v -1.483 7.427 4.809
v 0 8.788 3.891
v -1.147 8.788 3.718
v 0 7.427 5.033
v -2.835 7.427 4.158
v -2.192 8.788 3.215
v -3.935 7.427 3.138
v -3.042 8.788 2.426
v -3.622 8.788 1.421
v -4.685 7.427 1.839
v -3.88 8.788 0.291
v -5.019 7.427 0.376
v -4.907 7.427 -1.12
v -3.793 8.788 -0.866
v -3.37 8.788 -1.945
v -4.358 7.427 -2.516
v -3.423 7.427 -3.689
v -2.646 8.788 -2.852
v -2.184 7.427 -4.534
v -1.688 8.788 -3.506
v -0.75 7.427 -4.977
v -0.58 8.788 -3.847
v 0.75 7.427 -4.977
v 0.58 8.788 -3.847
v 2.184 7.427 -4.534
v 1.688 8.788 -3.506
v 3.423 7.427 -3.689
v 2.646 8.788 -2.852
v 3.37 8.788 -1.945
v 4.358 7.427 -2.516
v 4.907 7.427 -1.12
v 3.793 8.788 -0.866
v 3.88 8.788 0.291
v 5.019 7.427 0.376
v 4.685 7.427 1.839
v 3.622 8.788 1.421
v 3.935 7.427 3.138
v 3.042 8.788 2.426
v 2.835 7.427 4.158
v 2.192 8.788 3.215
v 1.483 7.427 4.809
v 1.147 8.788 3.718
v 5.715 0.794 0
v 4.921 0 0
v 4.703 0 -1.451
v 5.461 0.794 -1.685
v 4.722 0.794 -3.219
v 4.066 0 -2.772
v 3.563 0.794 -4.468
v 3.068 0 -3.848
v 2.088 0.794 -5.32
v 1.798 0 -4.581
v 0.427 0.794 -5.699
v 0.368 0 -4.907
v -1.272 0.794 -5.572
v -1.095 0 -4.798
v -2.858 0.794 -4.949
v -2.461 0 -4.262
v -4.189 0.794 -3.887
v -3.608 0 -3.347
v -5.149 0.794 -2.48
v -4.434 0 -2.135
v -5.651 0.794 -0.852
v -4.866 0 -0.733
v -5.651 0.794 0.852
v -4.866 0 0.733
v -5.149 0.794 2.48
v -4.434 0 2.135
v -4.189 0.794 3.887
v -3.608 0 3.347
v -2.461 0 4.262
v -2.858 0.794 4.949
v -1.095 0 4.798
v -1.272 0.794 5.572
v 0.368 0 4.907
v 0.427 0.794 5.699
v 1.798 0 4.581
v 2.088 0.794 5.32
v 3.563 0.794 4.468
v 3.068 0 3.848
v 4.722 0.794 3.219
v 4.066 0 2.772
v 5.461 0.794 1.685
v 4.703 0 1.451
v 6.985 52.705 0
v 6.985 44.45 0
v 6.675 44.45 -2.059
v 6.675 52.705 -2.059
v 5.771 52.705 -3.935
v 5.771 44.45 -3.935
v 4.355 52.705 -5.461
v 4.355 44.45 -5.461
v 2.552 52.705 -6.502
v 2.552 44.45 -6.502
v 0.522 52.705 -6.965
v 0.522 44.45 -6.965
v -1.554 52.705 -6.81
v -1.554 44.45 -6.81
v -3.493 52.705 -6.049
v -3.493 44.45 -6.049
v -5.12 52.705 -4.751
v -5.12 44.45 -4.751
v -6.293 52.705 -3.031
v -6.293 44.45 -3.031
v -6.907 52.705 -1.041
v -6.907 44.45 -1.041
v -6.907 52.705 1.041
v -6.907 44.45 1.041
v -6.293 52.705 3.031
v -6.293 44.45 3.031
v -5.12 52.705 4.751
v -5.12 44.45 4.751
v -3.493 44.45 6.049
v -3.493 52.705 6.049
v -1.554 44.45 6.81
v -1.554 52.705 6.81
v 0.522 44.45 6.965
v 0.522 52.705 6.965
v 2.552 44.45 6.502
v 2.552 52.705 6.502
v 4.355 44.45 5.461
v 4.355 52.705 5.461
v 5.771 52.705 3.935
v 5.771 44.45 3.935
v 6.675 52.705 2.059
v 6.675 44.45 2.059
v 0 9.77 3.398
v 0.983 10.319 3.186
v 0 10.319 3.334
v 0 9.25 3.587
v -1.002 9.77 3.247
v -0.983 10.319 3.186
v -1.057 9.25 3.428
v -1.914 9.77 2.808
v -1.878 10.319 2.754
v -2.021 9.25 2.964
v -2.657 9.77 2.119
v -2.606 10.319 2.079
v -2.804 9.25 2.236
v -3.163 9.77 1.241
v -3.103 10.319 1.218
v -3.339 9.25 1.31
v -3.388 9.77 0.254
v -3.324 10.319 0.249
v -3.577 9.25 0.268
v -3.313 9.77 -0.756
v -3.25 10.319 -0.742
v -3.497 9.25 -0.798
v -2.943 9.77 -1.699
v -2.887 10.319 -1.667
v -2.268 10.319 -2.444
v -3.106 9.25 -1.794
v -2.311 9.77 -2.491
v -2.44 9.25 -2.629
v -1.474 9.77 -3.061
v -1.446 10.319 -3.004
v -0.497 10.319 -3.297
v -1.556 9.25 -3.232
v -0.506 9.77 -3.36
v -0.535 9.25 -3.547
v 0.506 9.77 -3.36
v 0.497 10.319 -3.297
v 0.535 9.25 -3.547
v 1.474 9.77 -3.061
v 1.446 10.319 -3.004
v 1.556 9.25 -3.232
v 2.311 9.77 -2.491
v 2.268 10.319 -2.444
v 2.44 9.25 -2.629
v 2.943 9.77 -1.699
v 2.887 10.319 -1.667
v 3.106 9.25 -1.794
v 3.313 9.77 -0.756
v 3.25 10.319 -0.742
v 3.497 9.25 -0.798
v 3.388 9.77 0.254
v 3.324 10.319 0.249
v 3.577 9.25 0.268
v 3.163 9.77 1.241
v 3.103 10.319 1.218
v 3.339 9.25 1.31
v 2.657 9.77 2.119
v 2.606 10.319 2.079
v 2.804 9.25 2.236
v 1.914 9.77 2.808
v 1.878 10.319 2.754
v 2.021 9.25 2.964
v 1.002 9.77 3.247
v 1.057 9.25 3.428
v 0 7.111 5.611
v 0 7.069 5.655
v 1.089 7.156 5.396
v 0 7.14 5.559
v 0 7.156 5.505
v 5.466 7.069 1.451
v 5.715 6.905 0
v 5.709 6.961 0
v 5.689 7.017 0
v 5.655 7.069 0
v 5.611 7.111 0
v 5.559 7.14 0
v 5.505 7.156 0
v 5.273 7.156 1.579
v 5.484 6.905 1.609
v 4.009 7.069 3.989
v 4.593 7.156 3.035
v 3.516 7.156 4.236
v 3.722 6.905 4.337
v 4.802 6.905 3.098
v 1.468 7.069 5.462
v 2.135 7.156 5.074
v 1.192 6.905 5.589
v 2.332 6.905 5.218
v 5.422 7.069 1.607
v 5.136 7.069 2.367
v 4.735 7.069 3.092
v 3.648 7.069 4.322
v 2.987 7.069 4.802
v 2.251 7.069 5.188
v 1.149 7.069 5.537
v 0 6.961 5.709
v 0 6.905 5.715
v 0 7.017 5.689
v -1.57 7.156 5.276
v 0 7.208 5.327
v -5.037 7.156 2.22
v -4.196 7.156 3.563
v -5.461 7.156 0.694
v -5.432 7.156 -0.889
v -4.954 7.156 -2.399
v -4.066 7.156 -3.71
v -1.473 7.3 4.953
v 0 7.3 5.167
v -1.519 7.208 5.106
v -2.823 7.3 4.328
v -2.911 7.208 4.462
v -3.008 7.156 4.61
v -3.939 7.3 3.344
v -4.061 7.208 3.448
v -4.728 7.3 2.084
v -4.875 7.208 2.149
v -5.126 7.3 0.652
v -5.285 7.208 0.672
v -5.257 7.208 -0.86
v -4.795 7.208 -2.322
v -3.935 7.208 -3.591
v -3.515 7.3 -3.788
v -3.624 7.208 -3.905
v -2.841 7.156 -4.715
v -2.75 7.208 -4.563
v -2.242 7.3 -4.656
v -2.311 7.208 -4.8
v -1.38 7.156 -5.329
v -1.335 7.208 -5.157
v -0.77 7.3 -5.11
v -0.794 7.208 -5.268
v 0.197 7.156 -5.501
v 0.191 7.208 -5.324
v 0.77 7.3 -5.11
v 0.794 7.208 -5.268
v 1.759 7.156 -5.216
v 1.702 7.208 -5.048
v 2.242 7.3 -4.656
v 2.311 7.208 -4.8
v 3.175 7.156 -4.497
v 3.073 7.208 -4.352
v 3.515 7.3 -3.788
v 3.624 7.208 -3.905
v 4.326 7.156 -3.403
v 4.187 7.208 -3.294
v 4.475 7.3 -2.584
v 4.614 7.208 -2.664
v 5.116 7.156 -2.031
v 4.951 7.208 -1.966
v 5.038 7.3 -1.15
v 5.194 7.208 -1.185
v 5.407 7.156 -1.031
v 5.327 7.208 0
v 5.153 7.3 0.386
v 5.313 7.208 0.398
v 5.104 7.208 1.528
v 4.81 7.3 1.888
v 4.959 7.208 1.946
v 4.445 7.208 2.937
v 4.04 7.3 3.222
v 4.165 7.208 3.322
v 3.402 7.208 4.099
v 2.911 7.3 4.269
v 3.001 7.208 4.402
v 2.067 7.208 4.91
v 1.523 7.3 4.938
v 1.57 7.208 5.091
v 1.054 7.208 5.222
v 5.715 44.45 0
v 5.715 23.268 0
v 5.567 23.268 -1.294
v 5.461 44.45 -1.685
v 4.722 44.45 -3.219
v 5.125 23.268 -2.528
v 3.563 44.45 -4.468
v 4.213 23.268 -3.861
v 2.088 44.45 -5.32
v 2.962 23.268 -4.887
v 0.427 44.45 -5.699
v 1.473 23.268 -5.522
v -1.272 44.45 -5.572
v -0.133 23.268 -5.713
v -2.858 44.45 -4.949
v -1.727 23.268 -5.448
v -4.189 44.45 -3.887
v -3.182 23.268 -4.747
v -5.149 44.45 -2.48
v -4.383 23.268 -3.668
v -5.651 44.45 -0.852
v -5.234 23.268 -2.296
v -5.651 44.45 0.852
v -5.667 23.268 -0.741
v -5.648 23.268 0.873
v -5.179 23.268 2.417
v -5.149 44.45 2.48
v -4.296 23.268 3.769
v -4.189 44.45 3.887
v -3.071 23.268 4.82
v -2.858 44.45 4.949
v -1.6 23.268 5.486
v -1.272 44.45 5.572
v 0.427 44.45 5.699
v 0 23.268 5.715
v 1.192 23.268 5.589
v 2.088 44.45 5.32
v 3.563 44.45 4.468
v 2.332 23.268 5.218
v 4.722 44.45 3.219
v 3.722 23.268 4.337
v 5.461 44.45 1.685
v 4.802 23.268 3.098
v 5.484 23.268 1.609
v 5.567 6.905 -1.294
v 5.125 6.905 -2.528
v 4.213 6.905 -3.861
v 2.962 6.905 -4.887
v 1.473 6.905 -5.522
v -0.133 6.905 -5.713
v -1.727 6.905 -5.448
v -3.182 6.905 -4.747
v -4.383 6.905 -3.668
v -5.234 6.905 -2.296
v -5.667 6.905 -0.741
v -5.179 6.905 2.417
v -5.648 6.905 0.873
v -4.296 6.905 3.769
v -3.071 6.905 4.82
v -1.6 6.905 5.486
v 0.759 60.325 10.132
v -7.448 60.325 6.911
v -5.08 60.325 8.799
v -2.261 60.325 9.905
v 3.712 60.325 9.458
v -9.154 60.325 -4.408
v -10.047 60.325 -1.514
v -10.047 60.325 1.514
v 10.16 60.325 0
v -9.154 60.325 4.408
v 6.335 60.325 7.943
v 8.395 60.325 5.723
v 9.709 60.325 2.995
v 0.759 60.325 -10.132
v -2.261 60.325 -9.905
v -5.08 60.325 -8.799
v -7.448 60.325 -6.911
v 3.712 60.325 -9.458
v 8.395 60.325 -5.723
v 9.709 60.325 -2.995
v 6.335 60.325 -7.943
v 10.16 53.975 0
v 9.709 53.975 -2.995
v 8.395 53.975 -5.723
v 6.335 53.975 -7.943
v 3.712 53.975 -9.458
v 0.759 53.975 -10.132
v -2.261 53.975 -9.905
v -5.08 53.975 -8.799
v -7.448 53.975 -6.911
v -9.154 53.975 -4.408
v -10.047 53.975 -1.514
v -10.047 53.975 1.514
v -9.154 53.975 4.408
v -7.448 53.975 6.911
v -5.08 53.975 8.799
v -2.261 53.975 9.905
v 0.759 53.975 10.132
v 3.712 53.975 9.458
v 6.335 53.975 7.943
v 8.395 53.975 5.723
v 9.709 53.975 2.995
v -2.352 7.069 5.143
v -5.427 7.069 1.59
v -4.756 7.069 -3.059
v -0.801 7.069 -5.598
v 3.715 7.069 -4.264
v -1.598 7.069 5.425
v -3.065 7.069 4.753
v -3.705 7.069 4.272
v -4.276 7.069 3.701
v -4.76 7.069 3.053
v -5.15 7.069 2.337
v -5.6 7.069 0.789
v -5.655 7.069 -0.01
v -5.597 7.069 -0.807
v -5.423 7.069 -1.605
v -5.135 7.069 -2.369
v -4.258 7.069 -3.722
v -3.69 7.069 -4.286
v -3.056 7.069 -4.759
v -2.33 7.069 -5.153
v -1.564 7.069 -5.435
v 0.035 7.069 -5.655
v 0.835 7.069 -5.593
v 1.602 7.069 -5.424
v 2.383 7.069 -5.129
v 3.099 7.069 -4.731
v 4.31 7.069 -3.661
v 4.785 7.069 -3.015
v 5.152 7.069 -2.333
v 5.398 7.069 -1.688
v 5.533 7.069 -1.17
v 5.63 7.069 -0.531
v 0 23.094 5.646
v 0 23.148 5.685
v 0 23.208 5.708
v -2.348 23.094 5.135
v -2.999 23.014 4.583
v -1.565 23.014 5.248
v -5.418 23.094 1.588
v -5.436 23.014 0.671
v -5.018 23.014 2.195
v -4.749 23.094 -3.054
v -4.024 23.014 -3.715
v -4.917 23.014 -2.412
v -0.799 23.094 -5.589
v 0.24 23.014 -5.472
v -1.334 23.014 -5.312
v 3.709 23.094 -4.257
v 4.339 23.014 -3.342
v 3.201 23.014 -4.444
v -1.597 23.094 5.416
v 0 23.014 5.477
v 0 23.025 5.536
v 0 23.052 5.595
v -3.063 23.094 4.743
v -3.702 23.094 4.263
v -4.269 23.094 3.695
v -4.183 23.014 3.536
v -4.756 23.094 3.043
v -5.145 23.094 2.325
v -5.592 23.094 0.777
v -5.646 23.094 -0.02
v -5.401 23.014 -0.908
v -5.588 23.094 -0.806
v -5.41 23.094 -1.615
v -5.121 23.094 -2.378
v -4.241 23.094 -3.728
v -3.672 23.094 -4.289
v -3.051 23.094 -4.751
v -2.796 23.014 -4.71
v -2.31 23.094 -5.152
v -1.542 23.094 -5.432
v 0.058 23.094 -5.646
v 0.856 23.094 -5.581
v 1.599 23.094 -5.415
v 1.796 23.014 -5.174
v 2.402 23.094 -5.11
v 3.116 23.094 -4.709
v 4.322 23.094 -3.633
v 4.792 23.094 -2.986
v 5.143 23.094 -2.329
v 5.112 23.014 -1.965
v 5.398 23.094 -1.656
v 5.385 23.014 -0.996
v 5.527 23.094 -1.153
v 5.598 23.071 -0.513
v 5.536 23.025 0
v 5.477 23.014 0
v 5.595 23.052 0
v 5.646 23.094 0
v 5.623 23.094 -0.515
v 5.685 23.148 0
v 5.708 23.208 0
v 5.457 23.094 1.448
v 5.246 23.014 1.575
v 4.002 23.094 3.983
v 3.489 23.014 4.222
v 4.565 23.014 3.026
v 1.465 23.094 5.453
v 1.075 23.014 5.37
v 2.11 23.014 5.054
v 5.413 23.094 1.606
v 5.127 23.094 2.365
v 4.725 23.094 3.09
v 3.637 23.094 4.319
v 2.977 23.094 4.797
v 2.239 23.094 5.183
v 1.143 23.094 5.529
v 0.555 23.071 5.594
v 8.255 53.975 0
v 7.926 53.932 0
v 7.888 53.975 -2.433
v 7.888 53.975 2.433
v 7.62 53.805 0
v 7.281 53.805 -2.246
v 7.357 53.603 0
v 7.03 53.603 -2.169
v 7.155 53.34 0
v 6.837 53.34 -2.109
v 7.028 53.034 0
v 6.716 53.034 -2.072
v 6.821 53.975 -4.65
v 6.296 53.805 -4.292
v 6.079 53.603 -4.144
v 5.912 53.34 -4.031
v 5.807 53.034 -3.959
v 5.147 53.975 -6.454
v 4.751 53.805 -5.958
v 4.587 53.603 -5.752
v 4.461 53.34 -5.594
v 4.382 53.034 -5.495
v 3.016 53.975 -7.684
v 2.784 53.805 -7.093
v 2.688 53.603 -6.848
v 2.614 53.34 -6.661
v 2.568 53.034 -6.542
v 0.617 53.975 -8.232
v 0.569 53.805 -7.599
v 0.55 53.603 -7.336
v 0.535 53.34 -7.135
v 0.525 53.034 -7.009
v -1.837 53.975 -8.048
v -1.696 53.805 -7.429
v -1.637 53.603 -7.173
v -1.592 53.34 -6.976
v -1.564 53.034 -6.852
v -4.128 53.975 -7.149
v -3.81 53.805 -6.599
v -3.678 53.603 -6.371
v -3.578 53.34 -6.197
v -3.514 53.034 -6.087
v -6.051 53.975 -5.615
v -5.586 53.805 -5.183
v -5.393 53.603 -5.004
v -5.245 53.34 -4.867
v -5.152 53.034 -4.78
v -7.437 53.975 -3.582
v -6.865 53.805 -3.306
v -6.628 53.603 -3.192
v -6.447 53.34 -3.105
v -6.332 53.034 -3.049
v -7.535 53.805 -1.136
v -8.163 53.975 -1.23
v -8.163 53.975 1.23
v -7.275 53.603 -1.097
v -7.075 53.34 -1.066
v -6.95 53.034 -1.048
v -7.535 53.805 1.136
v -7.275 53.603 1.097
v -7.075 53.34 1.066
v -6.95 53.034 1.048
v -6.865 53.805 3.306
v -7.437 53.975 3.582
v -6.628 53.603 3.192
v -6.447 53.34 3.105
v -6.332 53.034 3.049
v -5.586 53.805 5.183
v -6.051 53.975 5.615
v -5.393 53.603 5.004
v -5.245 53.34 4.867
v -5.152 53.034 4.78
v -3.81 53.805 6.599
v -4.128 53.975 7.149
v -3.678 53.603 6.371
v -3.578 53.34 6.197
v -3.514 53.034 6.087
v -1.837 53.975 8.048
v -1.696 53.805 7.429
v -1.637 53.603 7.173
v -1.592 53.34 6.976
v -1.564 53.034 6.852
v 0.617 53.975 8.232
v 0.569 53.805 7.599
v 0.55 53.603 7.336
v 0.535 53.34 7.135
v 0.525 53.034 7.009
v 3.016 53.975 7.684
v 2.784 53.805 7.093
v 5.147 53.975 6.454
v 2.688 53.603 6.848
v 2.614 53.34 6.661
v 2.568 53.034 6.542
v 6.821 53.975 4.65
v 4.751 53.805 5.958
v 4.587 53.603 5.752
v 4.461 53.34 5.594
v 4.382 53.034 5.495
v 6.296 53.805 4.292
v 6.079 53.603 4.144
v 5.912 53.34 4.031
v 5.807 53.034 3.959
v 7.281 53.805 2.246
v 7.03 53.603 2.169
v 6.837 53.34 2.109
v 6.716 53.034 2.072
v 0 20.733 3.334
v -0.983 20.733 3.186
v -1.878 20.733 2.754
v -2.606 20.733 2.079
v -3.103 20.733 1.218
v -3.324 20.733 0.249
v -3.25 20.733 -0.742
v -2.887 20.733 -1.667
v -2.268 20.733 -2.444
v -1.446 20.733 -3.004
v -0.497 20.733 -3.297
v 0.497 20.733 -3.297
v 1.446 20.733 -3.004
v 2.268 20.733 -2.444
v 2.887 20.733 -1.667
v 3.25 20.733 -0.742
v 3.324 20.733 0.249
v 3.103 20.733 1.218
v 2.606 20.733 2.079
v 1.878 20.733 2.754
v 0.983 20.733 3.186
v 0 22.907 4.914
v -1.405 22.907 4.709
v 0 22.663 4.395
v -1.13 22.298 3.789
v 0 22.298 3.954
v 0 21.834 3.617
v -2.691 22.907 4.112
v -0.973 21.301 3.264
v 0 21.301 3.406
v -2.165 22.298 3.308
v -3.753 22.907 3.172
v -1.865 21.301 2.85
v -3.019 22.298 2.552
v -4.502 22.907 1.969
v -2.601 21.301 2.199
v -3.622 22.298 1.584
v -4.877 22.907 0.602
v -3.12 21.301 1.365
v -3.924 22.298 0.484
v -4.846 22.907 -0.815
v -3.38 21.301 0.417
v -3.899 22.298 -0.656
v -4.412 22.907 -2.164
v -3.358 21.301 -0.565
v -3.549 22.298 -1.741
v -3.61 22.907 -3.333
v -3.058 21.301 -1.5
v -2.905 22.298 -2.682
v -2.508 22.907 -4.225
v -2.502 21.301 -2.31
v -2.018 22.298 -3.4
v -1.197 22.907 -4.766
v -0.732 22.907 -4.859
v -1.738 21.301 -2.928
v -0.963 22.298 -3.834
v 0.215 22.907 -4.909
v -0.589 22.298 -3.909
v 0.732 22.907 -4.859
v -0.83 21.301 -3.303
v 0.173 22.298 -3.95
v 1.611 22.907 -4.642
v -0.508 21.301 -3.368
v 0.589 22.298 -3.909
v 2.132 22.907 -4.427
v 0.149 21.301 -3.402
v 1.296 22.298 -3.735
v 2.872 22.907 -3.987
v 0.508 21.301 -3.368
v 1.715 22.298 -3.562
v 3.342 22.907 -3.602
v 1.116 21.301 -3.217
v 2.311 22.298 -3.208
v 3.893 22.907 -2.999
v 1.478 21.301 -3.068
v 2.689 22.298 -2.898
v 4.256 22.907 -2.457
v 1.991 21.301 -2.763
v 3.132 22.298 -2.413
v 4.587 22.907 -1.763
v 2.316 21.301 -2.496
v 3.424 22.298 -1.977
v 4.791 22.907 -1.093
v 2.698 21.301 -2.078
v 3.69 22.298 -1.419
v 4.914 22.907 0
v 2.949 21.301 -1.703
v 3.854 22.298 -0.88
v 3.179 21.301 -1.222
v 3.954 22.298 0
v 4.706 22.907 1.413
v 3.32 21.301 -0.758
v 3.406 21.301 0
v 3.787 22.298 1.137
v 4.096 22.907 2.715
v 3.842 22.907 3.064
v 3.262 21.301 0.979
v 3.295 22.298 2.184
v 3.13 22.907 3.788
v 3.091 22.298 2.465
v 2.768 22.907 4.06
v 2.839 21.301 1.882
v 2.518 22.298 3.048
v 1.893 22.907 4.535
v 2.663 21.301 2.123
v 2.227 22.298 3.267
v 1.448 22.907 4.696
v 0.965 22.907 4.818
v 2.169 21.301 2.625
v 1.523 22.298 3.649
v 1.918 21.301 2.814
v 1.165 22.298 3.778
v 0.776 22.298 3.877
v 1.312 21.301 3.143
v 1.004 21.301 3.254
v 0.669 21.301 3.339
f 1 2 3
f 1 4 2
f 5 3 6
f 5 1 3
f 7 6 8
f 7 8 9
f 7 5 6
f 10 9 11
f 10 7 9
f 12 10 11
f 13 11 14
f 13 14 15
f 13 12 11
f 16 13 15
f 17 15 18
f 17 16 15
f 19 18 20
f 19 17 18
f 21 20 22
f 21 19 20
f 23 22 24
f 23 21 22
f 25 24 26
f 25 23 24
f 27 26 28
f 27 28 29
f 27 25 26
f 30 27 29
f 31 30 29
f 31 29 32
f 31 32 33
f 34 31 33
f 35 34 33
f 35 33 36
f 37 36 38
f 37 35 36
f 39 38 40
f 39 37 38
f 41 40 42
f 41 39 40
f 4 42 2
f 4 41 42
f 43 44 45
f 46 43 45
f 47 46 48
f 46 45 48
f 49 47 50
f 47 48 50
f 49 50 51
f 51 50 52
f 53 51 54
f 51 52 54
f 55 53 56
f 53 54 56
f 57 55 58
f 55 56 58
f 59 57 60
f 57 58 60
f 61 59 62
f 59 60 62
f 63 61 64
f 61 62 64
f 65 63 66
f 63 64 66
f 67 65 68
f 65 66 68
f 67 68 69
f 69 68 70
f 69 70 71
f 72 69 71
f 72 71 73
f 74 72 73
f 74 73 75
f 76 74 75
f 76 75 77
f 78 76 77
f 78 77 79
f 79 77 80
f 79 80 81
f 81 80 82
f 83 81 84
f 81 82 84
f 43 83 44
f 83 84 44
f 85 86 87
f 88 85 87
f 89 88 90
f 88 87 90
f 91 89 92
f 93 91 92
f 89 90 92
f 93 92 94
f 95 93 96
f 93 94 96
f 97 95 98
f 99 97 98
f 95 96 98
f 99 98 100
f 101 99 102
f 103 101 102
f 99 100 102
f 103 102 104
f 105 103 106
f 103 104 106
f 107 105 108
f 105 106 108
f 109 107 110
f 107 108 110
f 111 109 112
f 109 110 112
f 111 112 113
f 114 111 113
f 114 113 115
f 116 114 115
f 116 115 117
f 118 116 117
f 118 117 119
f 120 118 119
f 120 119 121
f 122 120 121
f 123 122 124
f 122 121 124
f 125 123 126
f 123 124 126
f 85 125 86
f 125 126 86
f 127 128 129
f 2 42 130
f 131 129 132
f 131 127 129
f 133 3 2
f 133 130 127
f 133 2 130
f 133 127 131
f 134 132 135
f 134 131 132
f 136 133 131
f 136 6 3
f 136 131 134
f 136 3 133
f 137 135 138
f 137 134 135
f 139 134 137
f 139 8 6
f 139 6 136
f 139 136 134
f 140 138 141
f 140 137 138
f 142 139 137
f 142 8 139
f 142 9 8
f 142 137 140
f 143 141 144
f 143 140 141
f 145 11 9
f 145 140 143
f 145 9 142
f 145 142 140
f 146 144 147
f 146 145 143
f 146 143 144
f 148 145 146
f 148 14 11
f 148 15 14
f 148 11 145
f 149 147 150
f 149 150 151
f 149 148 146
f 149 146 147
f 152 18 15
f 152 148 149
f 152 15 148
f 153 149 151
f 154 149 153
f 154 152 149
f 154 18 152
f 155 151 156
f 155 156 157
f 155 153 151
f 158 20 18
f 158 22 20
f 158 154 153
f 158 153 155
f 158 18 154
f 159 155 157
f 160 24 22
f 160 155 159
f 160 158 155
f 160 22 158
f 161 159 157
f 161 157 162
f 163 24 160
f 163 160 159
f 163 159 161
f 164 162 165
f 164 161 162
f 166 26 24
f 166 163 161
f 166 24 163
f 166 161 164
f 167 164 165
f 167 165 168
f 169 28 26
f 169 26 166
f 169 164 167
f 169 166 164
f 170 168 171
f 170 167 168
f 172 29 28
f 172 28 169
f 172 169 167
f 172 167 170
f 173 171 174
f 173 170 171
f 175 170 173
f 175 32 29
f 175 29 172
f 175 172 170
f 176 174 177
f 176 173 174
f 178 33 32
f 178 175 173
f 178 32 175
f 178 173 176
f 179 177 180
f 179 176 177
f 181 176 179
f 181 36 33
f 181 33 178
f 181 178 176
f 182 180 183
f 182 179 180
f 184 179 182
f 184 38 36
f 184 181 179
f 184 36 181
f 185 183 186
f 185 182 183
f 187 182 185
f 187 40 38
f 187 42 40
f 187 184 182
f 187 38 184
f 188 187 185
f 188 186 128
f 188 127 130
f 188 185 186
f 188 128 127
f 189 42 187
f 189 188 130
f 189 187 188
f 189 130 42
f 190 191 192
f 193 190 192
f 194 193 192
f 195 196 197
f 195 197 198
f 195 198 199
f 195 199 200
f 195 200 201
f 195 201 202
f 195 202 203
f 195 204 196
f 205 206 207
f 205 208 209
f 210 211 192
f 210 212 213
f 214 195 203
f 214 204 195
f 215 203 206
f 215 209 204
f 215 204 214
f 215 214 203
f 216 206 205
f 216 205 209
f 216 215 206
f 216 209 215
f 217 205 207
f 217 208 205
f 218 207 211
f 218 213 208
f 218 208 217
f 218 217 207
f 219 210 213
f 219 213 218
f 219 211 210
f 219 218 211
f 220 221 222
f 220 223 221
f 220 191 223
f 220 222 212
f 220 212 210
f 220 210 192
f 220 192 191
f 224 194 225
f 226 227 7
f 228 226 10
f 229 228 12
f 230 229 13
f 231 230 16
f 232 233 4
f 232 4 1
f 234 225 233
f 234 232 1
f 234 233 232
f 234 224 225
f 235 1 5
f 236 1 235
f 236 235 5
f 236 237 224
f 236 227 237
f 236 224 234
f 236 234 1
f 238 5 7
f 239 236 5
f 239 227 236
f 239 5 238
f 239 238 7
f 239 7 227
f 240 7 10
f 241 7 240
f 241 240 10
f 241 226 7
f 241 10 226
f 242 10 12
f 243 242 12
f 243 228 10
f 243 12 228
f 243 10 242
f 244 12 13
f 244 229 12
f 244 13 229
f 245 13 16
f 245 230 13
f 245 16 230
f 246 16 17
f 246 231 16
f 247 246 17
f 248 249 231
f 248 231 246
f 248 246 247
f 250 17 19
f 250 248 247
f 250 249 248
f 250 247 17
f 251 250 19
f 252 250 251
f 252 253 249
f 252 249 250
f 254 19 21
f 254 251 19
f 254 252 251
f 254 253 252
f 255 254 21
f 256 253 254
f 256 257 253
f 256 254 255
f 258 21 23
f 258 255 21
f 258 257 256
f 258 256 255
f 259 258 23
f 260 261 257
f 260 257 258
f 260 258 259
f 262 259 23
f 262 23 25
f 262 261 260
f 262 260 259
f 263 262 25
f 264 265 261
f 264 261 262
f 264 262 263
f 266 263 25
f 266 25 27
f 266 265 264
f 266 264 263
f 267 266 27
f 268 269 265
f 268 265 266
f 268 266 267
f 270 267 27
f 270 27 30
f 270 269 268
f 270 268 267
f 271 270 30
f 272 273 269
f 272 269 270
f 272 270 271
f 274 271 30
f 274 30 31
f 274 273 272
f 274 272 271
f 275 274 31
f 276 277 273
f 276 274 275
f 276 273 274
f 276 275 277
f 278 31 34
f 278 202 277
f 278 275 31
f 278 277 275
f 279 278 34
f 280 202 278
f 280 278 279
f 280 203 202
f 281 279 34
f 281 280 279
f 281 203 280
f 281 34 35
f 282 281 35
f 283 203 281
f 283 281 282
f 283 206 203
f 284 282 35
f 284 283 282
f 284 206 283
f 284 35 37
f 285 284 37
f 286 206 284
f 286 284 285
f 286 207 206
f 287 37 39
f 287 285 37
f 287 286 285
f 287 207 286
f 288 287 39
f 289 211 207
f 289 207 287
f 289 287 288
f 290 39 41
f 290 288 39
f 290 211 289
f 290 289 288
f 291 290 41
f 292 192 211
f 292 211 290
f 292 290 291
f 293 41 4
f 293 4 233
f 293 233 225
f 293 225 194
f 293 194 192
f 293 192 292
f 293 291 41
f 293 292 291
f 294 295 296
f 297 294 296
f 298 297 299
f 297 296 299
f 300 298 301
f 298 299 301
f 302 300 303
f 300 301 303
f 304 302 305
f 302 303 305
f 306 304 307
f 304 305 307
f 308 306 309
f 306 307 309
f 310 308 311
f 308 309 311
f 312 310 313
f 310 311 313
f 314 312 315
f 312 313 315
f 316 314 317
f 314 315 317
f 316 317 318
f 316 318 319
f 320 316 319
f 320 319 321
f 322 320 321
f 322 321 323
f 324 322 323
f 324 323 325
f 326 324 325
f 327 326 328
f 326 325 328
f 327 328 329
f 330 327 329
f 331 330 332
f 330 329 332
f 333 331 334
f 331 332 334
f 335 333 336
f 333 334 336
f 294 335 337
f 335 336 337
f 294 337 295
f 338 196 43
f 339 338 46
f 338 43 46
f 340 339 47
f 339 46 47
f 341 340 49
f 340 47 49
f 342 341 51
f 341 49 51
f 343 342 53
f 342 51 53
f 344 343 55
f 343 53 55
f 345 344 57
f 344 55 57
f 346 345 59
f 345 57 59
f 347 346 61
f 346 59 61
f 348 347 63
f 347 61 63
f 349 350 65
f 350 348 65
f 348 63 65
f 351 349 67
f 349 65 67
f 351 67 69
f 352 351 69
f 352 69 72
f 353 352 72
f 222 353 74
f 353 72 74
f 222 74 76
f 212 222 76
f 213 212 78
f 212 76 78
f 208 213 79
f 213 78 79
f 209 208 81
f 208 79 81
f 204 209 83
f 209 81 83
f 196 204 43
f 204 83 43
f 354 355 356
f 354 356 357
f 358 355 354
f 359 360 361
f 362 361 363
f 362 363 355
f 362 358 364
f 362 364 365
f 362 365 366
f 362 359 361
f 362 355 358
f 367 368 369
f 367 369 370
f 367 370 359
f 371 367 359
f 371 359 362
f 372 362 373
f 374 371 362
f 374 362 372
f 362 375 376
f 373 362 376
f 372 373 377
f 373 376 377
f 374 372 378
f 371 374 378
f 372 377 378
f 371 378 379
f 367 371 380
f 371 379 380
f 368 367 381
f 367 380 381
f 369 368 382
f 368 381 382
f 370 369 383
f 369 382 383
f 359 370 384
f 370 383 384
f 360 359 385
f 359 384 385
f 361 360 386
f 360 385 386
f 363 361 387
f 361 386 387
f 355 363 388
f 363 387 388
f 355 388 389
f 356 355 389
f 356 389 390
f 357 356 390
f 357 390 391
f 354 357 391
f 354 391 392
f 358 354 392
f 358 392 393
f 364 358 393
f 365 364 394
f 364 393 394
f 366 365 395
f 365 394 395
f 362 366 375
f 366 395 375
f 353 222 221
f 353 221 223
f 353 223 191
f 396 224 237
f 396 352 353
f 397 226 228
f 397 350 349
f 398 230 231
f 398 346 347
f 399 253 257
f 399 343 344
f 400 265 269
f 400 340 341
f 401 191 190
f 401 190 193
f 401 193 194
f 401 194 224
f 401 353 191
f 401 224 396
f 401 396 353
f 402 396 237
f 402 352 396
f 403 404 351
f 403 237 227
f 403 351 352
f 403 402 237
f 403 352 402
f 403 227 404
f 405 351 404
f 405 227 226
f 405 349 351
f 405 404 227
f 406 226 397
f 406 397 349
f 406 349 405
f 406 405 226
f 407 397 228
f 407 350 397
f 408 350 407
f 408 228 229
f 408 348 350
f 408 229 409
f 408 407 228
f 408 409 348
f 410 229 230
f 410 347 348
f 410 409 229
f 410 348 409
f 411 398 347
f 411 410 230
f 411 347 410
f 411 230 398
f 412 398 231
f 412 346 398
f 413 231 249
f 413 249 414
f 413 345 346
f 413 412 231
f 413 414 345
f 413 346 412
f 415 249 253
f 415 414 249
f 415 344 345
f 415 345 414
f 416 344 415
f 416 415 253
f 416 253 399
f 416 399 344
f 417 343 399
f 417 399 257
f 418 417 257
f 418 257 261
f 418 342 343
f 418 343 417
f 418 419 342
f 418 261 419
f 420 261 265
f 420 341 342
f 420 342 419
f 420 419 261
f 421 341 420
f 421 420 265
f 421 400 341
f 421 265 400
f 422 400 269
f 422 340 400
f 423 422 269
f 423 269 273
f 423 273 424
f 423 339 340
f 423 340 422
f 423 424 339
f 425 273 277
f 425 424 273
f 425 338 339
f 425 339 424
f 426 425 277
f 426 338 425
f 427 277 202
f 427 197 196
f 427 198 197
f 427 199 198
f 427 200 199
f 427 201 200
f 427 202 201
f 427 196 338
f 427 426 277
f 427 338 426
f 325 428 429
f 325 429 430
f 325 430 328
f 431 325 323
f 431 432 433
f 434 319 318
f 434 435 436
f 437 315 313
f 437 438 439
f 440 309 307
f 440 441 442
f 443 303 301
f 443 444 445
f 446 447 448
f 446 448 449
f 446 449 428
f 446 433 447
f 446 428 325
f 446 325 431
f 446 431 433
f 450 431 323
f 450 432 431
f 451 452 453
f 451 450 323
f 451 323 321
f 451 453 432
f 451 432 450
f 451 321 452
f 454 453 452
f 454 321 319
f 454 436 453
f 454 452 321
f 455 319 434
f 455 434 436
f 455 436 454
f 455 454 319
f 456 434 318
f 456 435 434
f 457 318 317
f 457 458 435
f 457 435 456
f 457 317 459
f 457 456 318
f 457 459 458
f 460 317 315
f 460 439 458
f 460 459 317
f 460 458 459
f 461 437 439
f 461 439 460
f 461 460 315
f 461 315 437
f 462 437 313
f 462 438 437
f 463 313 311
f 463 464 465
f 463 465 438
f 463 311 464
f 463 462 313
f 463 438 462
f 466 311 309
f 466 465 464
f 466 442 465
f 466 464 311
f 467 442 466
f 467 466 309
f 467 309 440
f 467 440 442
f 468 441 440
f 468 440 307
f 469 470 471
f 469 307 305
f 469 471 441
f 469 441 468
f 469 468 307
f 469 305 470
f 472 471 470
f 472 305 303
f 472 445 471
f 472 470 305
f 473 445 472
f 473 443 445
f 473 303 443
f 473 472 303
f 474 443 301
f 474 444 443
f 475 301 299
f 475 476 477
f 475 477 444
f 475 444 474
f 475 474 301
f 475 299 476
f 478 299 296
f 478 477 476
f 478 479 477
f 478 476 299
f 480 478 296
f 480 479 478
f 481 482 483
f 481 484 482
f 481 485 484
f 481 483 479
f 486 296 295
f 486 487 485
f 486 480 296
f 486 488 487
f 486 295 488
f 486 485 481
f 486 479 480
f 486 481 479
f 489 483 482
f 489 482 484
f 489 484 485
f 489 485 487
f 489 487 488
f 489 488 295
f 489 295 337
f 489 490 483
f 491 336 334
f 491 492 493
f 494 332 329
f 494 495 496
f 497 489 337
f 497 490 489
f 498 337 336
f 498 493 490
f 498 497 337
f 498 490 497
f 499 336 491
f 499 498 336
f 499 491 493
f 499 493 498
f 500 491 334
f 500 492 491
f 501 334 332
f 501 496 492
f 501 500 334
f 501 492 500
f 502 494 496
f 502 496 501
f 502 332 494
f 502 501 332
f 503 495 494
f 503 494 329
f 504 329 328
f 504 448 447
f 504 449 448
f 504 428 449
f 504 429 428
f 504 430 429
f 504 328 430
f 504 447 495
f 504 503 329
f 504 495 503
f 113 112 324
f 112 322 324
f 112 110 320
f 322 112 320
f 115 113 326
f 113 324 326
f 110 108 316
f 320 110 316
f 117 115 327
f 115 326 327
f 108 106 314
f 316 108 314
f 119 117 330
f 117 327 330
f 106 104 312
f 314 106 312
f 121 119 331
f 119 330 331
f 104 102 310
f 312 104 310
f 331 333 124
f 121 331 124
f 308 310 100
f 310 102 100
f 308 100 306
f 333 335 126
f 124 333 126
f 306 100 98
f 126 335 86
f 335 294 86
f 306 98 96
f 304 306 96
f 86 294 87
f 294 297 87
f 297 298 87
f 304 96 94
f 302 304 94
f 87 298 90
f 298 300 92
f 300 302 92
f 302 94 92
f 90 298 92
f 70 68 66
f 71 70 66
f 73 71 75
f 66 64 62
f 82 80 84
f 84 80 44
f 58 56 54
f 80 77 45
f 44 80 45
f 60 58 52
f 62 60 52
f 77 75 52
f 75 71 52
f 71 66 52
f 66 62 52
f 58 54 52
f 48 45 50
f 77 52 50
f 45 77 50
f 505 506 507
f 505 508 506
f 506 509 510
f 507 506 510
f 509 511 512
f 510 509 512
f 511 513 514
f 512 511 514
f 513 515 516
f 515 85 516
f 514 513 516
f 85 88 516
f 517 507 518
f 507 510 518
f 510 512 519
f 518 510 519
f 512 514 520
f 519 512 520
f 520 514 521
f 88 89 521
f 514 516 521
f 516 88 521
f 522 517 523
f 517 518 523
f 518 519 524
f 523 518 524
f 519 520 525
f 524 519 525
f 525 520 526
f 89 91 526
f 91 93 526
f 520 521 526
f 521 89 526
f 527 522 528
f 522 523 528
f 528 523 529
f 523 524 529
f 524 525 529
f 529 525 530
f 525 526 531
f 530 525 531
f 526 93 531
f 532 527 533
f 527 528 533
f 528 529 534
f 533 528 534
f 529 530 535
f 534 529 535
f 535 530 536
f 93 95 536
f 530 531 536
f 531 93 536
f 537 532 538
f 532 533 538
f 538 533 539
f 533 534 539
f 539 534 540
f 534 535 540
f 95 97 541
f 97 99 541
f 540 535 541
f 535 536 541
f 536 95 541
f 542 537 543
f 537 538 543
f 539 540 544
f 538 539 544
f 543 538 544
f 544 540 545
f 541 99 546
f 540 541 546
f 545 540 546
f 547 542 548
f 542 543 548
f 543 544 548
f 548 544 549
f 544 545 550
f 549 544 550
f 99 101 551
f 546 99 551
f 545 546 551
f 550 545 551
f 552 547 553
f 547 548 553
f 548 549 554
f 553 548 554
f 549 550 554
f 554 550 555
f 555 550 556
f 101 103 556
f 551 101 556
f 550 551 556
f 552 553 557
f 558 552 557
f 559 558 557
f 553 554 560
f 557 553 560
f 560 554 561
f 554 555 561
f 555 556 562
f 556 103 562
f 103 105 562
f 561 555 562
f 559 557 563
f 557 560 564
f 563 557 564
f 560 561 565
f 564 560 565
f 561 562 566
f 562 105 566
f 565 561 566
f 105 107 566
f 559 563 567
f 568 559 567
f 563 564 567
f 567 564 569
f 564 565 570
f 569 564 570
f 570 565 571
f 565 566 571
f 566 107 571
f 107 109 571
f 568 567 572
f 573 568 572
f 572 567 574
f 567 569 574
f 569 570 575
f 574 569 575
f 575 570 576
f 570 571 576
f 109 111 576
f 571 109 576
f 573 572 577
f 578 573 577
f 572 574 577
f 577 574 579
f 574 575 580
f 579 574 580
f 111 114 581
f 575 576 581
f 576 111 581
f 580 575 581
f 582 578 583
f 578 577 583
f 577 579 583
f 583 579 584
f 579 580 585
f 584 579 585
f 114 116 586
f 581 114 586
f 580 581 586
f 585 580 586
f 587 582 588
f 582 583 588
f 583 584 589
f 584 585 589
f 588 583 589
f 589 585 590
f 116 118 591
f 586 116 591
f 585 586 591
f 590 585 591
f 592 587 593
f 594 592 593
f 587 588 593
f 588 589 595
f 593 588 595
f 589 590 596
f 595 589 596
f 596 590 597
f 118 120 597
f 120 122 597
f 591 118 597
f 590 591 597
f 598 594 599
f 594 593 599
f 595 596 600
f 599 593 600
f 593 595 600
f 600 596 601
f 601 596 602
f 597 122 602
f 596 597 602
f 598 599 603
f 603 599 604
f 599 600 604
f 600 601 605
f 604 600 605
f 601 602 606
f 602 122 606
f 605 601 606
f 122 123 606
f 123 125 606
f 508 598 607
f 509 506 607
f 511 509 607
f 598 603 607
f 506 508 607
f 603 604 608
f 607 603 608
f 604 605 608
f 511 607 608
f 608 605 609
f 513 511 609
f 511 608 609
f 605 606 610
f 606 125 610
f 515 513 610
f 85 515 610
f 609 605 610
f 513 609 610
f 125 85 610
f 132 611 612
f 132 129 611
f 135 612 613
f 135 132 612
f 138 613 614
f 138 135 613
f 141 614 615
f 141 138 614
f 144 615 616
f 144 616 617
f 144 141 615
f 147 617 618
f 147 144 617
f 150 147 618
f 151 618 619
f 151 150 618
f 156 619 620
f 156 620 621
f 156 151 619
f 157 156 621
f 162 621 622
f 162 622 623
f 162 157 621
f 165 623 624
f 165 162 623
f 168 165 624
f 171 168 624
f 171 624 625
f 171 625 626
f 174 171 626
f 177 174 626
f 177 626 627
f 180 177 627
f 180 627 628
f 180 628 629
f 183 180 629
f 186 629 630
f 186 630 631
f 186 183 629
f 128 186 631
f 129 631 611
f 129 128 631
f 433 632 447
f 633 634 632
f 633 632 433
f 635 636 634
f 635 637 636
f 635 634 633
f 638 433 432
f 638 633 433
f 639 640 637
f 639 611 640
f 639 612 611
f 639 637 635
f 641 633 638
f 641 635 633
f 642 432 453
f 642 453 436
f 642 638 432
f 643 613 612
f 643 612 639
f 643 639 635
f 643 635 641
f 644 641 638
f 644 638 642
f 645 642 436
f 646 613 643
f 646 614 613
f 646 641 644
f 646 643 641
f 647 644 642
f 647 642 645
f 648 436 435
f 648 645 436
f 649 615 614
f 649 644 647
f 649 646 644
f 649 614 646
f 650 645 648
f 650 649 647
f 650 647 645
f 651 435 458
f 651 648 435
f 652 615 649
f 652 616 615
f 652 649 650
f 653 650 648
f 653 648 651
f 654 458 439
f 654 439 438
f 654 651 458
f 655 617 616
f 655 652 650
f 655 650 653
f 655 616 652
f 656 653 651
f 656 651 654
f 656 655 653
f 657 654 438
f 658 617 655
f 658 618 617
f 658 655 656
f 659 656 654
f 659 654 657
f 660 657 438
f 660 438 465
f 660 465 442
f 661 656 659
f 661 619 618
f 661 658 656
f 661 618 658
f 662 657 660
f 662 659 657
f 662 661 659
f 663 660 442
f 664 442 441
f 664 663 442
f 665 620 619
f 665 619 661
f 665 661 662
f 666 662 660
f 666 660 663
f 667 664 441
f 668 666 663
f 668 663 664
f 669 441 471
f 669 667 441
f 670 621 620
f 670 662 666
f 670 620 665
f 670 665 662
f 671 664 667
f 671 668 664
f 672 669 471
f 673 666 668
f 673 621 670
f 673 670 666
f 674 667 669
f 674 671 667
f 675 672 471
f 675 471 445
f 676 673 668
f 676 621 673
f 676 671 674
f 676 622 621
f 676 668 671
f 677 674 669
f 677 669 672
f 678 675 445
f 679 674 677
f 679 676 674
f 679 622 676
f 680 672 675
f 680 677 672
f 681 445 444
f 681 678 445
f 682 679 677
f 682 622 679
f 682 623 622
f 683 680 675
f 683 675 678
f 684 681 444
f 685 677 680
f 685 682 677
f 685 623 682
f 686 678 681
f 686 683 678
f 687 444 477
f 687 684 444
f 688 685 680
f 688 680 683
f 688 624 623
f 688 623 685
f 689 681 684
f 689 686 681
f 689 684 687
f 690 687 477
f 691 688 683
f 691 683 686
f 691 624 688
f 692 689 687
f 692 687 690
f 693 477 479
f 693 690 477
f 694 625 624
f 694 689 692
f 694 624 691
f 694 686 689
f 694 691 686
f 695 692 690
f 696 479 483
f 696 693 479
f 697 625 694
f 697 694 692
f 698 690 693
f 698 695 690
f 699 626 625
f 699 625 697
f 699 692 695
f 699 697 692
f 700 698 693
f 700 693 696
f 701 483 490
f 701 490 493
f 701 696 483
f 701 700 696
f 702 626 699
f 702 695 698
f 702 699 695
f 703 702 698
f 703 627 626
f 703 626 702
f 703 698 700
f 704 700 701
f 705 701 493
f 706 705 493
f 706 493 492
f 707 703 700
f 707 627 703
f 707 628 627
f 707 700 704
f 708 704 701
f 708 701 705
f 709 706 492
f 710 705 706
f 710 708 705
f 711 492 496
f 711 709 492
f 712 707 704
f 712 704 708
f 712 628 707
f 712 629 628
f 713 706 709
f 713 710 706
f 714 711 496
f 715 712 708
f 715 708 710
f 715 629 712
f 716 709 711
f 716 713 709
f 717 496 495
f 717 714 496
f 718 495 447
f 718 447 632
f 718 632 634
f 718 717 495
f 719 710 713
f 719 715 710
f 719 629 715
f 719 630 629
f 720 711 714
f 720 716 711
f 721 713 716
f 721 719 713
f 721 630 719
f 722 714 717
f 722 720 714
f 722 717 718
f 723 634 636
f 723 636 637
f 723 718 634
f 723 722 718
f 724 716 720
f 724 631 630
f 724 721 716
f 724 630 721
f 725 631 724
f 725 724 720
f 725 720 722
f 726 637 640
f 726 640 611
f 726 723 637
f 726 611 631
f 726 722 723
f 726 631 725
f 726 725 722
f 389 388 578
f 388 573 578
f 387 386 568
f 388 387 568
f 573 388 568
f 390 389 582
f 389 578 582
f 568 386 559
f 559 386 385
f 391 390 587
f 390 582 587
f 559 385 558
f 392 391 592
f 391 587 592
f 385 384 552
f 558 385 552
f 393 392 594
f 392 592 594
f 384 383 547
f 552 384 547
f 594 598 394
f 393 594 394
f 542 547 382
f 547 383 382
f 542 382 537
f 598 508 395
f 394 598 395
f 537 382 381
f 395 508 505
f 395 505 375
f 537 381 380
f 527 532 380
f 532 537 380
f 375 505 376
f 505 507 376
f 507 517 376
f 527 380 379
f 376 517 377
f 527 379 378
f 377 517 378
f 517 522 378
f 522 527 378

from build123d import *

# Parameters (mm, degrees)
SKETCH1_R               = 5.715
MAIN_DEPTH              = 44.45
CHAMFER1_SIZE           = 0.79375
FILLET1_R               = 0.254
SKETCH6_R               = 6.985
SPRING_STABILIZER_DEPTH = 9.525
SKETCH3_R               = 10.16
TOP_CAP_DEPTH           = 6.35
FILLET2_R               = 1.27


with BuildPart() as part:
    # Sketch1 → main (new body)
    with BuildSketch(Plane(origin=(0, 0, 0), x_dir=(1, 0, 0), z_dir=(0, 1, 0))):
        Circle(SKETCH1_R)
    extrude(amount=MAIN_DEPTH)

    # Chamfer1
    chamfer1_edges = [part.edges().sort_by_distance(p)[0] for p in [
        (-5.715, 0, 0),
    ]]
    chamfer(chamfer1_edges, length=CHAMFER1_SIZE)

    # Sketch2 → Cut-Revolve1 (revolve, cut)
    with BuildSketch(Plane(origin=(0, 0, 0), x_dir=(0, 0, -1), z_dir=(1, 0, 0))):
        with BuildLine():
            Line((-3.89085667, 8.788112004), (-5.032724148, 7.427287335))
            ThreePointArc((-5.032724148, 7.427287335), (-5.30531868, 7.218118194), (-5.640771925, 7.14375))
            Line((-5.640771925, 7.14375), (-5.715, 7.14375))
            Line((-5.715, 7.14375), (-5.715, 23.01875))
            Line((-5.715, 23.01875), (-5.61975, 23.01875))
            ThreePointArc((-5.61975, 23.01875), (-4.003303898, 22.349196102), (-3.33375, 20.73275))
            Line((-3.33375, 20.73275), (-3.33375, 10.31875))
            ThreePointArc((-3.33375, 10.31875), (-3.477356947, 9.504314534), (-3.89085667, 8.788112004))
        make_face()
    revolve(axis=Axis((0, 44.45, 0), (0, -1, 0)), mode=Mode.SUBTRACT)

    # Fillet1
    fillet1_edges = [part.edges().sort_by_distance(p)[0] for p in [
        (-5.715, 7.14375, 0),
        (-5.715, 23.01875, 0),
    ]]
    fillet(fillet1_edges, radius=FILLET1_R)

    # Sketch6 → spring_stabilizer (add)
    with BuildSketch(Plane(origin=(0, 44.45, 0), x_dir=(1, 0, 0), z_dir=(0, 1, 0))):
        Circle(SKETCH6_R)
    extrude(amount=SPRING_STABILIZER_DEPTH)

    # Sketch3 → top_cap (add)
    with BuildSketch(Plane(origin=(0, 53.975, 0), x_dir=(1, 0, 0), z_dir=(0, 1, 0))):
        Circle(SKETCH3_R)
    extrude(amount=TOP_CAP_DEPTH)

    # Fillet2
    fillet2_edges = [part.edges().sort_by_distance(p)[0] for p in [
        (-6.985, 53.975, 0),
    ]]
    fillet(fillet2_edges, radius=FILLET2_R)


solid = part.part
